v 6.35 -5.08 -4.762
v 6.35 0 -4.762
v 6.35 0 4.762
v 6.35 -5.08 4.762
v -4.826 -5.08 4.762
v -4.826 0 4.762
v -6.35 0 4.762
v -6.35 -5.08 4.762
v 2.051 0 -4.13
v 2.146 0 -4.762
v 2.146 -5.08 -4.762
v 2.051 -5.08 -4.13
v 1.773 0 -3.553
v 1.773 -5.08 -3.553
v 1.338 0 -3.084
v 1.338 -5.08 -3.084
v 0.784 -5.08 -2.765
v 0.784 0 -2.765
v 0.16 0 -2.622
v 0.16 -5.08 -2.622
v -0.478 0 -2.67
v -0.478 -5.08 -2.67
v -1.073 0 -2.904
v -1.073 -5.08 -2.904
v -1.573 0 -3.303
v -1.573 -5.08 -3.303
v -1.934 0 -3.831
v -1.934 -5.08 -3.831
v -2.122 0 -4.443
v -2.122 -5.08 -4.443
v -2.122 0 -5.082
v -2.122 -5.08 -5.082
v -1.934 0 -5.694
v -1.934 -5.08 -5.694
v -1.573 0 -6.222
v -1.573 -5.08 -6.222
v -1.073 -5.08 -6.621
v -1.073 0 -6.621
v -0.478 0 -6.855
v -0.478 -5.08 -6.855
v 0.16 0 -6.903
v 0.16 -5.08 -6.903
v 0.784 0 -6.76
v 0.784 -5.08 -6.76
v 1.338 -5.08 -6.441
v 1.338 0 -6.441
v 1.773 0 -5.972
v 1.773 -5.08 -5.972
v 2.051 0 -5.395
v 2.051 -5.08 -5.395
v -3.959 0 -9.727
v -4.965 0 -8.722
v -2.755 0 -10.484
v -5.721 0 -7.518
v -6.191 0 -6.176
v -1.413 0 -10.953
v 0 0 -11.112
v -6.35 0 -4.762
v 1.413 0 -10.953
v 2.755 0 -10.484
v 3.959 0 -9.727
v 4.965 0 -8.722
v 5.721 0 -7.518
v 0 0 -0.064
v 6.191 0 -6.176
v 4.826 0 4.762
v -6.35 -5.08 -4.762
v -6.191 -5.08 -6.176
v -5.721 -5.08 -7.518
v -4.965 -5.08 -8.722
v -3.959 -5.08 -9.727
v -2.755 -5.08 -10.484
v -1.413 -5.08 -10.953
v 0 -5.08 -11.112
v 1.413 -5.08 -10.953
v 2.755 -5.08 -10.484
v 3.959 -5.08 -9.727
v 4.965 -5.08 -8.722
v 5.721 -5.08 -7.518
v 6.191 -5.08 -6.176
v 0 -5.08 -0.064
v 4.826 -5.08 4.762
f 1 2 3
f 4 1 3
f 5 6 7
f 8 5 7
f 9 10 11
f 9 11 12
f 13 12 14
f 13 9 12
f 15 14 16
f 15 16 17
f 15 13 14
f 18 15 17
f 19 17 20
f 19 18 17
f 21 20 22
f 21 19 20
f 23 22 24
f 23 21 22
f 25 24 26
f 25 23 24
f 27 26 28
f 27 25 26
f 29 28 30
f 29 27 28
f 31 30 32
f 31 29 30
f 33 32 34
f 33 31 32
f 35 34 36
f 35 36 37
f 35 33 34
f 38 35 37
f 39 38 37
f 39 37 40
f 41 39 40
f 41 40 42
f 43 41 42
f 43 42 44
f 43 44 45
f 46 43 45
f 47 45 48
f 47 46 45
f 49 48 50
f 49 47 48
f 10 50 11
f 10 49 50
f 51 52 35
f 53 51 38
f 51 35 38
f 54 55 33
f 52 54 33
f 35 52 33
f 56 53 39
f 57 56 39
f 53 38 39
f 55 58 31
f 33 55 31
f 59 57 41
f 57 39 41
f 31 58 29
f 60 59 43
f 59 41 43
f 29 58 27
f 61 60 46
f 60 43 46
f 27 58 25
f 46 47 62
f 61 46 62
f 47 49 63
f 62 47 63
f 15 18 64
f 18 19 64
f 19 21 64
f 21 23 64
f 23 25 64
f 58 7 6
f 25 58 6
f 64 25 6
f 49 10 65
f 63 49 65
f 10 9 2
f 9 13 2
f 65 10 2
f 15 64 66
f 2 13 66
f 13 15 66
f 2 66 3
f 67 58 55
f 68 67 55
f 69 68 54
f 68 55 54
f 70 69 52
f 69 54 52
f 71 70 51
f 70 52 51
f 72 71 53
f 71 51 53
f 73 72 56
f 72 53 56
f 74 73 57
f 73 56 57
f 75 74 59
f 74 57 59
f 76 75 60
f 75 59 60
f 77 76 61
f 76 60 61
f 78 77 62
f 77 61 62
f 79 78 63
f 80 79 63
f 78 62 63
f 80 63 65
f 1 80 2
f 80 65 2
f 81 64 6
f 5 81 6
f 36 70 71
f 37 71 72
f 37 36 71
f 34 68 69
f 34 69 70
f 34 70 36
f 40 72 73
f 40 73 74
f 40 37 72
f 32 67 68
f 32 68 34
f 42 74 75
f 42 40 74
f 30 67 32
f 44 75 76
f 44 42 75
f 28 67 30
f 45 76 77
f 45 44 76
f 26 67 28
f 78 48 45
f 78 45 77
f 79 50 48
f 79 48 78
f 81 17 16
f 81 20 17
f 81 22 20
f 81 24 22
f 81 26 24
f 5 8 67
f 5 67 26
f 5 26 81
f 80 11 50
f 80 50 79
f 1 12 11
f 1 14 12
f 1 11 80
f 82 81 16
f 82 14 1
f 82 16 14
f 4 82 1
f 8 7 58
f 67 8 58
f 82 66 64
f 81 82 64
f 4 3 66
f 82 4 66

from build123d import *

# Parameters (mm, degrees)
F0_R     = 2.1463
F1_DEPTH = 5.08


with BuildPart() as f1:
    # F0 (on Front) → F1 (new body)
    with BuildSketch(Plane.XZ):
        with BuildLine():
            Line((6.35, -4.7625), (6.35, 4.7625))
            Line((6.35, 4.7625), (4.826, 4.7625))
            Line((4.826, 4.7625), (0, -0.0635))
            Line((0, -0.0635), (-4.826, 4.7625))
            Line((-4.826, 4.7625), (-6.35, 4.7625))
            Line((-6.35, 4.7625), (-6.35, -4.7625))
            ThreePointArc((-6.35, -4.7625), (0, -11.1125), (6.35, -4.7625))
        make_face()
        with Locations((0, -4.7625)):
            Circle(F0_R, mode=Mode.SUBTRACT)
    extrude(amount=F1_DEPTH)


solid = f1.part
